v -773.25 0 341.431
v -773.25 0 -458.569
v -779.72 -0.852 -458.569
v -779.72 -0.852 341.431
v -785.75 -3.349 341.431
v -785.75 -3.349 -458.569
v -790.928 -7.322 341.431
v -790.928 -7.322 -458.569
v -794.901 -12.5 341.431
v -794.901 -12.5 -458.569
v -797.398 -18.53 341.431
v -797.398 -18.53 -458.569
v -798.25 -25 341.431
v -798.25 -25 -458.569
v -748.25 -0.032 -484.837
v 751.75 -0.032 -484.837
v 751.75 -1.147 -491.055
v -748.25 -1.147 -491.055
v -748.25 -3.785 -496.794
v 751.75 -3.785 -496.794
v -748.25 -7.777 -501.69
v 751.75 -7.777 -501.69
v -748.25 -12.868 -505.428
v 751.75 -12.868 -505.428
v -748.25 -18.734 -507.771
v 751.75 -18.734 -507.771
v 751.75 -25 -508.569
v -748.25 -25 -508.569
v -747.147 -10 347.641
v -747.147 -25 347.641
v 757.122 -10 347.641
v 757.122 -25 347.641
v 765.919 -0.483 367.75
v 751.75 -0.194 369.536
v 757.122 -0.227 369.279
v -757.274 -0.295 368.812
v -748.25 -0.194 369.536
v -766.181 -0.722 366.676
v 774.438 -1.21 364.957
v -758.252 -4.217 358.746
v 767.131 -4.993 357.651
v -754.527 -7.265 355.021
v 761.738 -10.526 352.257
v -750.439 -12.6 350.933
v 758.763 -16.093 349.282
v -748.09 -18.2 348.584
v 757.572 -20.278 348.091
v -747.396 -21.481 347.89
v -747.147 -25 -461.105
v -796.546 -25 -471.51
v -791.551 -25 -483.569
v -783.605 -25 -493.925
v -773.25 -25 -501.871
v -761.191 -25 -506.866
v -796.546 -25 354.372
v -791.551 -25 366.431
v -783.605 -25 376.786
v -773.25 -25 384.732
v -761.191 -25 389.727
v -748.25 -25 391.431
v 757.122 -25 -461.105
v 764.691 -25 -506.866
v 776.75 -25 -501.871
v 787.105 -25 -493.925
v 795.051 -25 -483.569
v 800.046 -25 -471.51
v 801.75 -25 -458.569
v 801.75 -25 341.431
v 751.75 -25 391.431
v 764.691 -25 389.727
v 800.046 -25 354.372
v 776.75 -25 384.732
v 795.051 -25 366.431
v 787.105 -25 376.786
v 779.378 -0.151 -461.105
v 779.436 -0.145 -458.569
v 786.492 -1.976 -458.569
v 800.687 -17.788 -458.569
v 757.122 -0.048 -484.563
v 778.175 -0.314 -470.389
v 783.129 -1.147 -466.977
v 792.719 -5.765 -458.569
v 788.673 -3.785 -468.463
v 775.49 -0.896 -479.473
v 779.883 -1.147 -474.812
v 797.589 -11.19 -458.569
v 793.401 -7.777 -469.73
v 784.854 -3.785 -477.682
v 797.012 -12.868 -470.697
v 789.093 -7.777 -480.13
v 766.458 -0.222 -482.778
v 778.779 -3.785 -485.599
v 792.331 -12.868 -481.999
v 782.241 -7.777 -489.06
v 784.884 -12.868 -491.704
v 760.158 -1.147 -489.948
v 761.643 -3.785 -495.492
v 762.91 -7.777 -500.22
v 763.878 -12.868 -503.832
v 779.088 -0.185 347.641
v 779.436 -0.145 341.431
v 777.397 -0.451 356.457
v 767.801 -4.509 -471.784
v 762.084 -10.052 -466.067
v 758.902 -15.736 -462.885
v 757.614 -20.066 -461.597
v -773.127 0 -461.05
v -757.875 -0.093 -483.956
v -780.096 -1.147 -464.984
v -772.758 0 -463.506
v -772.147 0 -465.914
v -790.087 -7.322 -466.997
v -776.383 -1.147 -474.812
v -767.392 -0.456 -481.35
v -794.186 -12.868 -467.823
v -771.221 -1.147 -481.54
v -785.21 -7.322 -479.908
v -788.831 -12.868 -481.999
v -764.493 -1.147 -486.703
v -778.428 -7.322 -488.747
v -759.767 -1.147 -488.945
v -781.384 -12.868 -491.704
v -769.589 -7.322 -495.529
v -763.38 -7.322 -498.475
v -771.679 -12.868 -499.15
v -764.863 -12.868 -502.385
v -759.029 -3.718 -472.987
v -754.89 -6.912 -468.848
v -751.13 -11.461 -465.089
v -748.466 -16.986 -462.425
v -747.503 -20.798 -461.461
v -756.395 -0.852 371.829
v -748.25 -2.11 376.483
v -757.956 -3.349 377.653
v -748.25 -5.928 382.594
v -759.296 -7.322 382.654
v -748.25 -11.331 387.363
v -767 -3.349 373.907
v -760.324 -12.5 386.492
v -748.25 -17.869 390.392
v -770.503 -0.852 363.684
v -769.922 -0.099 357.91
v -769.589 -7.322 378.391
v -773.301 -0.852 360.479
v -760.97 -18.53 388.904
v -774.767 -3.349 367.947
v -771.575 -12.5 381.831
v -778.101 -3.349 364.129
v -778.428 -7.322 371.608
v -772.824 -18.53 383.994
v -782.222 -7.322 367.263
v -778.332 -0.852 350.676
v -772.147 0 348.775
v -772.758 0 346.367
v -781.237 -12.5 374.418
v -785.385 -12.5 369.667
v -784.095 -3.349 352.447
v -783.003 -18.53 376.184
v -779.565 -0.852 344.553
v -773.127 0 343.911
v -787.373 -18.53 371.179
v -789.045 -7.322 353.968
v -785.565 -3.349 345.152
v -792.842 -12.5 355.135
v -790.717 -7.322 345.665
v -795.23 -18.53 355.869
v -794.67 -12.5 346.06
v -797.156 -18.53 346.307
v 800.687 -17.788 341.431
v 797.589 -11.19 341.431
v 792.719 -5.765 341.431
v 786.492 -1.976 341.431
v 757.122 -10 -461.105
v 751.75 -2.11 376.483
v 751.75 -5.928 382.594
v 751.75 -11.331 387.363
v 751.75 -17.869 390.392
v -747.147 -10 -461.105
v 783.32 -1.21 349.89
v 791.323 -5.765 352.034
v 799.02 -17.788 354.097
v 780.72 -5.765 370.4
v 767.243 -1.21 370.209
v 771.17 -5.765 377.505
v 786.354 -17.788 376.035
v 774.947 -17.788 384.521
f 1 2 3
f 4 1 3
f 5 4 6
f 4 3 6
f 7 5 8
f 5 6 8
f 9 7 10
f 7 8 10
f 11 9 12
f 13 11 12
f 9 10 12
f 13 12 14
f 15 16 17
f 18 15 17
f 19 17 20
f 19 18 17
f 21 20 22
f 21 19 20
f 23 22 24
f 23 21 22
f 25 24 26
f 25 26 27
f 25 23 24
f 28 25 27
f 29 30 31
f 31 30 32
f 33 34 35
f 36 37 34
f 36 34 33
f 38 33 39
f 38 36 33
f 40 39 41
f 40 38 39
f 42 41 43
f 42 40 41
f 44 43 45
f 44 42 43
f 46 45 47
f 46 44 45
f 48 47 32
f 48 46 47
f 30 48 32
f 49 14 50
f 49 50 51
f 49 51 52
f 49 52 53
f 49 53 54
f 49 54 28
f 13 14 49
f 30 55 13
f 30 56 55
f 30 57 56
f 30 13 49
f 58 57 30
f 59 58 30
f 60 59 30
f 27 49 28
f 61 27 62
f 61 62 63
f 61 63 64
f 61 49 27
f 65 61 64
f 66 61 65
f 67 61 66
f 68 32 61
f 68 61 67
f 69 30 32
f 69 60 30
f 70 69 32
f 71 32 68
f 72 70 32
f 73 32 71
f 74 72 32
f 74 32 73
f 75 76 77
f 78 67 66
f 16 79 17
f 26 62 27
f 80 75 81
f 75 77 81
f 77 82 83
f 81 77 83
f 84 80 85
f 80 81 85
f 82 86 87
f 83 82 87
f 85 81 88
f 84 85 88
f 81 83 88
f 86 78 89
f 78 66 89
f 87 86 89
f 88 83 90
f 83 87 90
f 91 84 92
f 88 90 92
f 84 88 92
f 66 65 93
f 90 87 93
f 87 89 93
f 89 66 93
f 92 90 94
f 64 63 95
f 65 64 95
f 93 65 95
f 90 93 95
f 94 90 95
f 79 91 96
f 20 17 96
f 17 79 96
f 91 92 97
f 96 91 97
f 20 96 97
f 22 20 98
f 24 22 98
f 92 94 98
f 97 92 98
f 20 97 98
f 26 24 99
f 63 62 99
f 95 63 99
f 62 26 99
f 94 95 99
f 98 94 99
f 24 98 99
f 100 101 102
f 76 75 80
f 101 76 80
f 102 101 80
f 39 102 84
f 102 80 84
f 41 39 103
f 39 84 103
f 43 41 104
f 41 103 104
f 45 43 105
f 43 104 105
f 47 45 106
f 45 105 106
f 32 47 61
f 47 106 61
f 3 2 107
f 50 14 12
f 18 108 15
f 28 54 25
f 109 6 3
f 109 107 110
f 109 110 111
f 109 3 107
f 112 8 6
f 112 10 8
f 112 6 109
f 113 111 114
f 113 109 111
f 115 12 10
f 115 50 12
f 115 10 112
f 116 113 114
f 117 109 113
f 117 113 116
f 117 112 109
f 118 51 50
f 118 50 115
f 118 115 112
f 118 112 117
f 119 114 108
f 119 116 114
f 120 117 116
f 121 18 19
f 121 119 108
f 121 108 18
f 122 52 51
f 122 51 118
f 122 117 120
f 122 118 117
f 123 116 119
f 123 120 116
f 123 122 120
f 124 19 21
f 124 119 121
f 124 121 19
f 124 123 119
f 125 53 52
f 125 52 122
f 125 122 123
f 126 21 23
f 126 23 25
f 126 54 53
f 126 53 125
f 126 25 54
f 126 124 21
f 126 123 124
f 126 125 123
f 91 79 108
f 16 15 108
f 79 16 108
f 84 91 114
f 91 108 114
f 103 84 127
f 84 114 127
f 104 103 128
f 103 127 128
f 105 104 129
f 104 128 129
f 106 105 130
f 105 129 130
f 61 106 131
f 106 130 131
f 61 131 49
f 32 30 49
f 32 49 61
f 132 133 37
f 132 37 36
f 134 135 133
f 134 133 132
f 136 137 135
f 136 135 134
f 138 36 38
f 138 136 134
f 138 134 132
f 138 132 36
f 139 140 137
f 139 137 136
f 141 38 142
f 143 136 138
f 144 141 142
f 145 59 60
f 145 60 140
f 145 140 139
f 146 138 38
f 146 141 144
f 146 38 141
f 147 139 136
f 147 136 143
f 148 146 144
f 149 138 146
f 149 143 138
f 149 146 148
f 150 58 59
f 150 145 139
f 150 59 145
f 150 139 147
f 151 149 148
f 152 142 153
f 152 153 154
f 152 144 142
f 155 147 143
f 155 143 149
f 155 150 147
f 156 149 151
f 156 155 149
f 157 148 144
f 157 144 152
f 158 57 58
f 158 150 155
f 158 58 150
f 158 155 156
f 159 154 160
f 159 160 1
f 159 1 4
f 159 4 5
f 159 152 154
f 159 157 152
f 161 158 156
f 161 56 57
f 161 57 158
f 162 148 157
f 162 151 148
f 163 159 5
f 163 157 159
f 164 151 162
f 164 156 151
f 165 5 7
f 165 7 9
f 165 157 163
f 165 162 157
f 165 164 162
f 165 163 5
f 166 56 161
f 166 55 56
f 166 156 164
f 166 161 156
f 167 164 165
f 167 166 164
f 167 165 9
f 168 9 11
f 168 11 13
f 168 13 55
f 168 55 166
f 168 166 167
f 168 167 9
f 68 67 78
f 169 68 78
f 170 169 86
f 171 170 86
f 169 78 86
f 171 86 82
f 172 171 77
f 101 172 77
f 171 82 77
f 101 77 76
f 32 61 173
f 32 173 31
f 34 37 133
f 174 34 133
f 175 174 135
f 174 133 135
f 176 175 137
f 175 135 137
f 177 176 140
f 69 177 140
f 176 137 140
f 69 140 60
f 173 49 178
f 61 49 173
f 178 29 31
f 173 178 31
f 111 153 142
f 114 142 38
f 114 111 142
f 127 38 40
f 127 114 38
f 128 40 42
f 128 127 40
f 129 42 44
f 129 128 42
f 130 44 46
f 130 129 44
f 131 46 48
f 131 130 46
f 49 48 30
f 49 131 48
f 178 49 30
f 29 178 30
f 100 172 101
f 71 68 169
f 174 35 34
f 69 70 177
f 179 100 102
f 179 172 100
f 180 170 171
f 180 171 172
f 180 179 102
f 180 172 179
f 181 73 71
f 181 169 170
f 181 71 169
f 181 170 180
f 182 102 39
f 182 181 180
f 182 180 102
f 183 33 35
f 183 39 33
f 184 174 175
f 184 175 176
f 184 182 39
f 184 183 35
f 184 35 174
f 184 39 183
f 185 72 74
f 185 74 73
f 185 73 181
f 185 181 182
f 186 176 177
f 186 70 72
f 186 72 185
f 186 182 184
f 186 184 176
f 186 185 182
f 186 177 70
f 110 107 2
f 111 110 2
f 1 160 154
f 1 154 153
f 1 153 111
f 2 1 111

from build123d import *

# Parameters (mm, degrees)
F0_W         = 1600
F0_H         = 900
F0_W_2       = 1504.2692422867
F0_H_2       = 808.7469339371
F1_DEPTH     = 25
F2_W         = 1504.2692422867
F2_H         = 808.7469339371
F3_DEPTH     = 15
F4_R         = 50
F5_T1_DEPTH  = 808.7469339371
F5_T3_DEPTH  = 1504.2692422867
F5_T5_DEPTH  = 800
F5_T7_DEPTH  = 1500
F5_T10_ANGLE = 90
F5_T12_ANGLE = 90
F5_T14_ANGLE = 90
F5_T16_ANGLE = 90
F5_T21_DEPTH = 1566.7692422867
F5_T25_DEPTH = 871.2469339371
F5_T32_DEPTH = 871.2469339371
F5_T36_DEPTH = 1566.7692422867
F5_T43_DEPTH = 1566.7692422867
F5_T47_DEPTH = 871.2469339371
F5_T54_DEPTH = 1566.7692422867
F5_T58_DEPTH = 871.2469339371


# Not quite as in the source:
# - a fillet or chamfer that OpenCascade refuses, or shapes differently, is made with other operations: its cross-section is extruded or revolved along the edge and cut away or added


with BuildPart() as f1:
    # F0 (on Front) → F1 (new body)
    with BuildSketch(Plane.XZ):
        with Locations((1.7499998212, -58.5693205115)):
            Rectangle(F0_W, F0_H)
        with Locations((4.9877166748, -56.7320287228)):
            Rectangle(F0_W_2, F0_H_2, mode=Mode.SUBTRACT)
    extrude(amount=F1_DEPTH)

    # F4
    f4_edges = [f1.edges().sort_by_distance(p)[0] for p in [
        (801.75, -12.5, 391.430679),
        (801.75, -12.5, -508.569321),
        (-798.25, -12.5, -508.569321),
        (-798.25, -12.5, 391.430679),
    ]]
    fillet(f4_edges, radius=F4_R)

    # F5: fillet of radius 25 on 12 edges, made by hand

    # F5_s2 → F5_t1 (cut)
    with BuildSketch(Plane.XY.offset(-461.1054956913)):
        with BuildLine():
            ThreePointArc((782.1223378181, 0), (764.4446682885, -7.3223304703), (757.1223378181, -25))
            Line((757.1223378181, -25), (757.1223378181, 0))
            Line((757.1223378181, 0), (782.1223378181, 0))
        make_face()
        with BuildLine():
            ThreePointArc((-772.1469044685, 0), (-754.4692349389, -7.3223304703), (-747.1469044685, -25))
            Line((-747.1469044685, -25), (-747.1469044685, 0))
            Line((-747.1469044685, 0), (-772.1469044685, 0))
        make_face()
    extrude(amount=F5_T1_DEPTH, mode=Mode.SUBTRACT)

    # F5_s4 → F5_t3 (cut)
    with BuildSketch(Plane.YZ.offset(-747.1469044685)):
        with BuildLine():
            ThreePointArc((0, 372.6414382458), (-7.3223304703, 354.9637687161), (-25, 347.6414382458))
            Line((-25, 347.6414382458), (0, 347.6414382458))
            Line((0, 347.6414382458), (0, 372.6414382458))
        make_face()
        with BuildLine():
            ThreePointArc((0, -486.1054956913), (-7.3223304703, -468.4278261616), (-25, -461.1054956913))
            Line((-25, -461.1054956913), (0, -461.1054956913))
            Line((0, -461.1054956913), (0, -486.1054956913))
        make_face()
    extrude(amount=F5_T3_DEPTH, mode=Mode.SUBTRACT)

    # F5_s6 → F5_t5 (cut)
    with BuildSketch(Plane.XY.offset(-458.5693205115)):
        with BuildLine():
            ThreePointArc((-773.2500001788, 0), (-790.9276697085, -7.3223304703), (-798.2500001788, -25))
            Line((-798.2500001788, -25), (-798.2500001788, 0))
            Line((-798.2500001788, 0), (-773.2500001788, 0))
        make_face()
        with BuildLine():
            ThreePointArc((801.7499998212, -25), (794.4276693508, -7.3223304703), (776.7499998212, 0))
            Line((776.7499998212, 0), (801.7499998212, 0))
            Line((801.7499998212, 0), (801.7499998212, -25))
        make_face()
    extrude(amount=F5_T5_DEPTH, mode=Mode.SUBTRACT)

    # F5_s8 → F5_t7 (cut)
    with BuildSketch(Plane.YZ.offset(-748.2500001788)):
        with BuildLine():
            ThreePointArc((0, 366.4306794885), (-7.3223304703, 384.1083490182), (-25, 391.4306794885))
            Line((-25, 391.4306794885), (0, 391.4306794885))
            Line((0, 391.4306794885), (0, 366.4306794885))
        make_face()
        with BuildLine():
            ThreePointArc((0, -483.5693205115), (-7.3223304703, -501.2469900411), (-25, -508.5693205115))
            Line((-25, -508.5693205115), (0, -508.5693205115))
            Line((0, -508.5693205115), (0, -483.5693205115))
        make_face()
    extrude(amount=F5_T7_DEPTH, mode=Mode.SUBTRACT)

    # F5_s9 → F5_t10 (revolve, cut)
    with BuildSketch(Plane.YZ.offset(-748.2500001788)):
        with BuildLine():
            ThreePointArc((0, 366.4306794885), (-7.3223304703, 384.1083490182), (-25, 391.4306794885))
            Line((-25, 391.4306794885), (0, 391.4306794885))
            Line((0, 391.4306794885), (0, 366.4306794885))
        make_face()
    revolve(axis=Axis((-748.2500001788, 0, 341.4306794885), (0, -1, 0)), revolution_arc=F5_T10_ANGLE, mode=Mode.SUBTRACT)

    # F5_s11 → F5_t12 (revolve, cut)
    with BuildSketch(Plane.XY.offset(341.4306794885)):
        with BuildLine():
            ThreePointArc((776.7499998212, 0), (794.4276693508, -7.3223304703), (801.7499998212, -25))
            Line((801.7499998212, -25), (801.7499998212, 0))
            Line((801.7499998212, 0), (776.7499998212, 0))
        make_face()
    revolve(axis=Axis((751.7499998212, 0, 341.4306794885), (0, -1, 0)), revolution_arc=F5_T12_ANGLE, mode=Mode.SUBTRACT)

    # F5_s13 → F5_t14 (revolve, cut)
    with BuildSketch(Plane.XY.offset(-458.5693205115)):
        with BuildLine():
            ThreePointArc((776.7499998212, 0), (794.4276693508, -7.3223304703), (801.7499998212, -25))
            Line((801.7499998212, -25), (801.7499998212, 0))
            Line((801.7499998212, 0), (776.7499998212, 0))
        make_face()
    revolve(axis=Axis((751.7499998212, 0, -458.5693205115), (0, 1, 0)), revolution_arc=F5_T14_ANGLE, mode=Mode.SUBTRACT)

    # F5_s15 → F5_t16 (revolve, cut)
    with BuildSketch(Plane.XY.offset(-458.5693205115)):
        with BuildLine():
            ThreePointArc((-773.2500001788, 0), (-790.9276697085, -7.3223304703), (-798.2500001788, -25))
            Line((-798.2500001788, -25), (-798.2500001788, 0))
            Line((-798.2500001788, 0), (-773.2500001788, 0))
        make_face()
    revolve(axis=Axis((-748.2500001788, 0, -458.5693205115), (0, -1, 0)), revolution_arc=F5_T16_ANGLE, mode=Mode.SUBTRACT)


with BuildPart() as f3:
    # F2 (on face) → F3 (new body)
    with BuildSketch(Plane.XZ.offset(25)):
        with Locations((4.9877166748, -56.7320287228)):
            Rectangle(F2_W, F2_H)
    extrude(amount=-F3_DEPTH)


with BuildPart() as f5_tool19:
    # F5_s20 → F5_t21 (new body)
    with BuildSketch(Plane.YZ.offset(-747.1469044685)):
        with BuildLine():
            ThreePointArc((0, 372.6414382458), (-7.3223304703, 354.9637687161), (-25, 347.6414382458))
            Line((-25, 347.6414382458), (0, 347.6414382458))
            Line((0, 347.6414382458), (0, 372.6414382458))
        make_face()
    extrude(amount=F5_T21_DEPTH)

    split(bisect_by=Plane.YZ.offset(757.1223378181), keep=Keep.TOP)


with BuildPart() as f5_tool23:
    # F5_s24 → F5_t25 (new body)
    with BuildSketch(Plane.XY.offset(410.1414382458)):
        with BuildLine():
            ThreePointArc((782.1223378181, 0), (764.4446682885, -7.3223304703), (757.1223378181, -25))
            Line((757.1223378181, -25), (757.1223378181, 0))
            Line((757.1223378181, 0), (782.1223378181, 0))
        make_face()
    extrude(amount=-F5_T25_DEPTH)

    split(bisect_by=Plane.XY.offset(347.6414382458), keep=Keep.TOP)


with BuildPart() as f5_tool19_1:
    add(f5_tool19.part)

    # F5_t27: intersect F5_tool23
    add(f5_tool23.part, mode=Mode.INTERSECT)


with BuildPart() as f1_1:
    add(f1.part)

    # F5_t17: cut F5_tool19
    add(f5_tool19_1.part, mode=Mode.SUBTRACT)


with BuildPart() as f5_tool30:
    # F5_s31 → F5_t32 (new body)
    with BuildSketch(Plane.XY.offset(347.6414382458)):
        with BuildLine():
            ThreePointArc((782.1223378181, 0), (764.4446682885, -7.3223304703), (757.1223378181, -25))
            Line((757.1223378181, -25), (757.1223378181, 0))
            Line((757.1223378181, 0), (782.1223378181, 0))
        make_face()
    extrude(amount=-F5_T32_DEPTH)

    split(bisect_by=Plane.XY.offset(-461.1054956913), keep=Keep.BOTTOM)


with BuildPart() as f5_tool34:
    # F5_s35 → F5_t36 (new body)
    with BuildSketch(Plane.YZ.offset(819.6223378181)):
        with BuildLine():
            ThreePointArc((0, -486.1054956913), (-7.3223304703, -468.4278261616), (-25, -461.1054956913))
            Line((-25, -461.1054956913), (0, -461.1054956913))
            Line((0, -461.1054956913), (0, -486.1054956913))
        make_face()
    extrude(amount=-F5_T36_DEPTH)

    split(bisect_by=Plane.YZ.offset(757.1223378181), keep=Keep.TOP)


with BuildPart() as f5_tool30_1:
    add(f5_tool30.part)

    # F5_t38: intersect F5_tool34
    add(f5_tool34.part, mode=Mode.INTERSECT)


with BuildPart() as f1_2:
    add(f1_1.part)

    # F5_t28: cut F5_tool30
    add(f5_tool30_1.part, mode=Mode.SUBTRACT)


with BuildPart() as f5_tool41:
    # F5_s42 → F5_t43 (new body)
    with BuildSketch(Plane.YZ.offset(-809.6469044685)):
        with BuildLine():
            ThreePointArc((0, 372.6414382458), (-7.3223304703, 354.9637687161), (-25, 347.6414382458))
            Line((-25, 347.6414382458), (0, 347.6414382458))
            Line((0, 347.6414382458), (0, 372.6414382458))
        make_face()
    extrude(amount=F5_T43_DEPTH)

    split(bisect_by=Plane.YZ.offset(-747.1469044685), keep=Keep.BOTTOM)


with BuildPart() as f5_tool45:
    # F5_s46 → F5_t47 (new body)
    with BuildSketch(Plane.XY.offset(-461.1054956913)):
        with BuildLine():
            ThreePointArc((-772.1469044685, 0), (-754.4692349389, -7.3223304703), (-747.1469044685, -25))
            Line((-747.1469044685, -25), (-747.1469044685, 0))
            Line((-747.1469044685, 0), (-772.1469044685, 0))
        make_face()
    extrude(amount=F5_T47_DEPTH)

    split(bisect_by=Plane.XY.offset(347.6414382458), keep=Keep.TOP)


with BuildPart() as f5_tool41_1:
    add(f5_tool41.part)

    # F5_t49: intersect F5_tool45
    add(f5_tool45.part, mode=Mode.INTERSECT)


with BuildPart() as f1_3:
    add(f1_2.part)

    # F5_t39: cut F5_tool41
    add(f5_tool41_1.part, mode=Mode.SUBTRACT)


with BuildPart() as f5_tool52:
    # F5_s53 → F5_t54 (new body)
    with BuildSketch(Plane.YZ.offset(757.1223378181)):
        with BuildLine():
            ThreePointArc((0, -486.1054956913), (-7.3223304703, -468.4278261616), (-25, -461.1054956913))
            Line((-25, -461.1054956913), (0, -461.1054956913))
            Line((0, -461.1054956913), (0, -486.1054956913))
        make_face()
    extrude(amount=-F5_T54_DEPTH)

    split(bisect_by=Plane.YZ.offset(-747.1469044685), keep=Keep.BOTTOM)


with BuildPart() as f5_tool56:
    # F5_s57 → F5_t58 (new body)
    with BuildSketch(Plane.XY.offset(-523.6054956913)):
        with BuildLine():
            ThreePointArc((-772.1469044685, 0), (-754.4692349389, -7.3223304703), (-747.1469044685, -25))
            Line((-747.1469044685, -25), (-747.1469044685, 0))
            Line((-747.1469044685, 0), (-772.1469044685, 0))
        make_face()
    extrude(amount=F5_T58_DEPTH)

    split(bisect_by=Plane.XY.offset(-461.1054956913), keep=Keep.BOTTOM)


with BuildPart() as f5_tool52_1:
    add(f5_tool52.part)

    # F5_t60: intersect F5_tool56
    add(f5_tool56.part, mode=Mode.INTERSECT)


with BuildPart() as f1_4:
    add(f1_3.part)

    # F5_t50: cut F5_tool52
    add(f5_tool52_1.part, mode=Mode.SUBTRACT)


solid = Compound([f3.part, f1_4.part])
